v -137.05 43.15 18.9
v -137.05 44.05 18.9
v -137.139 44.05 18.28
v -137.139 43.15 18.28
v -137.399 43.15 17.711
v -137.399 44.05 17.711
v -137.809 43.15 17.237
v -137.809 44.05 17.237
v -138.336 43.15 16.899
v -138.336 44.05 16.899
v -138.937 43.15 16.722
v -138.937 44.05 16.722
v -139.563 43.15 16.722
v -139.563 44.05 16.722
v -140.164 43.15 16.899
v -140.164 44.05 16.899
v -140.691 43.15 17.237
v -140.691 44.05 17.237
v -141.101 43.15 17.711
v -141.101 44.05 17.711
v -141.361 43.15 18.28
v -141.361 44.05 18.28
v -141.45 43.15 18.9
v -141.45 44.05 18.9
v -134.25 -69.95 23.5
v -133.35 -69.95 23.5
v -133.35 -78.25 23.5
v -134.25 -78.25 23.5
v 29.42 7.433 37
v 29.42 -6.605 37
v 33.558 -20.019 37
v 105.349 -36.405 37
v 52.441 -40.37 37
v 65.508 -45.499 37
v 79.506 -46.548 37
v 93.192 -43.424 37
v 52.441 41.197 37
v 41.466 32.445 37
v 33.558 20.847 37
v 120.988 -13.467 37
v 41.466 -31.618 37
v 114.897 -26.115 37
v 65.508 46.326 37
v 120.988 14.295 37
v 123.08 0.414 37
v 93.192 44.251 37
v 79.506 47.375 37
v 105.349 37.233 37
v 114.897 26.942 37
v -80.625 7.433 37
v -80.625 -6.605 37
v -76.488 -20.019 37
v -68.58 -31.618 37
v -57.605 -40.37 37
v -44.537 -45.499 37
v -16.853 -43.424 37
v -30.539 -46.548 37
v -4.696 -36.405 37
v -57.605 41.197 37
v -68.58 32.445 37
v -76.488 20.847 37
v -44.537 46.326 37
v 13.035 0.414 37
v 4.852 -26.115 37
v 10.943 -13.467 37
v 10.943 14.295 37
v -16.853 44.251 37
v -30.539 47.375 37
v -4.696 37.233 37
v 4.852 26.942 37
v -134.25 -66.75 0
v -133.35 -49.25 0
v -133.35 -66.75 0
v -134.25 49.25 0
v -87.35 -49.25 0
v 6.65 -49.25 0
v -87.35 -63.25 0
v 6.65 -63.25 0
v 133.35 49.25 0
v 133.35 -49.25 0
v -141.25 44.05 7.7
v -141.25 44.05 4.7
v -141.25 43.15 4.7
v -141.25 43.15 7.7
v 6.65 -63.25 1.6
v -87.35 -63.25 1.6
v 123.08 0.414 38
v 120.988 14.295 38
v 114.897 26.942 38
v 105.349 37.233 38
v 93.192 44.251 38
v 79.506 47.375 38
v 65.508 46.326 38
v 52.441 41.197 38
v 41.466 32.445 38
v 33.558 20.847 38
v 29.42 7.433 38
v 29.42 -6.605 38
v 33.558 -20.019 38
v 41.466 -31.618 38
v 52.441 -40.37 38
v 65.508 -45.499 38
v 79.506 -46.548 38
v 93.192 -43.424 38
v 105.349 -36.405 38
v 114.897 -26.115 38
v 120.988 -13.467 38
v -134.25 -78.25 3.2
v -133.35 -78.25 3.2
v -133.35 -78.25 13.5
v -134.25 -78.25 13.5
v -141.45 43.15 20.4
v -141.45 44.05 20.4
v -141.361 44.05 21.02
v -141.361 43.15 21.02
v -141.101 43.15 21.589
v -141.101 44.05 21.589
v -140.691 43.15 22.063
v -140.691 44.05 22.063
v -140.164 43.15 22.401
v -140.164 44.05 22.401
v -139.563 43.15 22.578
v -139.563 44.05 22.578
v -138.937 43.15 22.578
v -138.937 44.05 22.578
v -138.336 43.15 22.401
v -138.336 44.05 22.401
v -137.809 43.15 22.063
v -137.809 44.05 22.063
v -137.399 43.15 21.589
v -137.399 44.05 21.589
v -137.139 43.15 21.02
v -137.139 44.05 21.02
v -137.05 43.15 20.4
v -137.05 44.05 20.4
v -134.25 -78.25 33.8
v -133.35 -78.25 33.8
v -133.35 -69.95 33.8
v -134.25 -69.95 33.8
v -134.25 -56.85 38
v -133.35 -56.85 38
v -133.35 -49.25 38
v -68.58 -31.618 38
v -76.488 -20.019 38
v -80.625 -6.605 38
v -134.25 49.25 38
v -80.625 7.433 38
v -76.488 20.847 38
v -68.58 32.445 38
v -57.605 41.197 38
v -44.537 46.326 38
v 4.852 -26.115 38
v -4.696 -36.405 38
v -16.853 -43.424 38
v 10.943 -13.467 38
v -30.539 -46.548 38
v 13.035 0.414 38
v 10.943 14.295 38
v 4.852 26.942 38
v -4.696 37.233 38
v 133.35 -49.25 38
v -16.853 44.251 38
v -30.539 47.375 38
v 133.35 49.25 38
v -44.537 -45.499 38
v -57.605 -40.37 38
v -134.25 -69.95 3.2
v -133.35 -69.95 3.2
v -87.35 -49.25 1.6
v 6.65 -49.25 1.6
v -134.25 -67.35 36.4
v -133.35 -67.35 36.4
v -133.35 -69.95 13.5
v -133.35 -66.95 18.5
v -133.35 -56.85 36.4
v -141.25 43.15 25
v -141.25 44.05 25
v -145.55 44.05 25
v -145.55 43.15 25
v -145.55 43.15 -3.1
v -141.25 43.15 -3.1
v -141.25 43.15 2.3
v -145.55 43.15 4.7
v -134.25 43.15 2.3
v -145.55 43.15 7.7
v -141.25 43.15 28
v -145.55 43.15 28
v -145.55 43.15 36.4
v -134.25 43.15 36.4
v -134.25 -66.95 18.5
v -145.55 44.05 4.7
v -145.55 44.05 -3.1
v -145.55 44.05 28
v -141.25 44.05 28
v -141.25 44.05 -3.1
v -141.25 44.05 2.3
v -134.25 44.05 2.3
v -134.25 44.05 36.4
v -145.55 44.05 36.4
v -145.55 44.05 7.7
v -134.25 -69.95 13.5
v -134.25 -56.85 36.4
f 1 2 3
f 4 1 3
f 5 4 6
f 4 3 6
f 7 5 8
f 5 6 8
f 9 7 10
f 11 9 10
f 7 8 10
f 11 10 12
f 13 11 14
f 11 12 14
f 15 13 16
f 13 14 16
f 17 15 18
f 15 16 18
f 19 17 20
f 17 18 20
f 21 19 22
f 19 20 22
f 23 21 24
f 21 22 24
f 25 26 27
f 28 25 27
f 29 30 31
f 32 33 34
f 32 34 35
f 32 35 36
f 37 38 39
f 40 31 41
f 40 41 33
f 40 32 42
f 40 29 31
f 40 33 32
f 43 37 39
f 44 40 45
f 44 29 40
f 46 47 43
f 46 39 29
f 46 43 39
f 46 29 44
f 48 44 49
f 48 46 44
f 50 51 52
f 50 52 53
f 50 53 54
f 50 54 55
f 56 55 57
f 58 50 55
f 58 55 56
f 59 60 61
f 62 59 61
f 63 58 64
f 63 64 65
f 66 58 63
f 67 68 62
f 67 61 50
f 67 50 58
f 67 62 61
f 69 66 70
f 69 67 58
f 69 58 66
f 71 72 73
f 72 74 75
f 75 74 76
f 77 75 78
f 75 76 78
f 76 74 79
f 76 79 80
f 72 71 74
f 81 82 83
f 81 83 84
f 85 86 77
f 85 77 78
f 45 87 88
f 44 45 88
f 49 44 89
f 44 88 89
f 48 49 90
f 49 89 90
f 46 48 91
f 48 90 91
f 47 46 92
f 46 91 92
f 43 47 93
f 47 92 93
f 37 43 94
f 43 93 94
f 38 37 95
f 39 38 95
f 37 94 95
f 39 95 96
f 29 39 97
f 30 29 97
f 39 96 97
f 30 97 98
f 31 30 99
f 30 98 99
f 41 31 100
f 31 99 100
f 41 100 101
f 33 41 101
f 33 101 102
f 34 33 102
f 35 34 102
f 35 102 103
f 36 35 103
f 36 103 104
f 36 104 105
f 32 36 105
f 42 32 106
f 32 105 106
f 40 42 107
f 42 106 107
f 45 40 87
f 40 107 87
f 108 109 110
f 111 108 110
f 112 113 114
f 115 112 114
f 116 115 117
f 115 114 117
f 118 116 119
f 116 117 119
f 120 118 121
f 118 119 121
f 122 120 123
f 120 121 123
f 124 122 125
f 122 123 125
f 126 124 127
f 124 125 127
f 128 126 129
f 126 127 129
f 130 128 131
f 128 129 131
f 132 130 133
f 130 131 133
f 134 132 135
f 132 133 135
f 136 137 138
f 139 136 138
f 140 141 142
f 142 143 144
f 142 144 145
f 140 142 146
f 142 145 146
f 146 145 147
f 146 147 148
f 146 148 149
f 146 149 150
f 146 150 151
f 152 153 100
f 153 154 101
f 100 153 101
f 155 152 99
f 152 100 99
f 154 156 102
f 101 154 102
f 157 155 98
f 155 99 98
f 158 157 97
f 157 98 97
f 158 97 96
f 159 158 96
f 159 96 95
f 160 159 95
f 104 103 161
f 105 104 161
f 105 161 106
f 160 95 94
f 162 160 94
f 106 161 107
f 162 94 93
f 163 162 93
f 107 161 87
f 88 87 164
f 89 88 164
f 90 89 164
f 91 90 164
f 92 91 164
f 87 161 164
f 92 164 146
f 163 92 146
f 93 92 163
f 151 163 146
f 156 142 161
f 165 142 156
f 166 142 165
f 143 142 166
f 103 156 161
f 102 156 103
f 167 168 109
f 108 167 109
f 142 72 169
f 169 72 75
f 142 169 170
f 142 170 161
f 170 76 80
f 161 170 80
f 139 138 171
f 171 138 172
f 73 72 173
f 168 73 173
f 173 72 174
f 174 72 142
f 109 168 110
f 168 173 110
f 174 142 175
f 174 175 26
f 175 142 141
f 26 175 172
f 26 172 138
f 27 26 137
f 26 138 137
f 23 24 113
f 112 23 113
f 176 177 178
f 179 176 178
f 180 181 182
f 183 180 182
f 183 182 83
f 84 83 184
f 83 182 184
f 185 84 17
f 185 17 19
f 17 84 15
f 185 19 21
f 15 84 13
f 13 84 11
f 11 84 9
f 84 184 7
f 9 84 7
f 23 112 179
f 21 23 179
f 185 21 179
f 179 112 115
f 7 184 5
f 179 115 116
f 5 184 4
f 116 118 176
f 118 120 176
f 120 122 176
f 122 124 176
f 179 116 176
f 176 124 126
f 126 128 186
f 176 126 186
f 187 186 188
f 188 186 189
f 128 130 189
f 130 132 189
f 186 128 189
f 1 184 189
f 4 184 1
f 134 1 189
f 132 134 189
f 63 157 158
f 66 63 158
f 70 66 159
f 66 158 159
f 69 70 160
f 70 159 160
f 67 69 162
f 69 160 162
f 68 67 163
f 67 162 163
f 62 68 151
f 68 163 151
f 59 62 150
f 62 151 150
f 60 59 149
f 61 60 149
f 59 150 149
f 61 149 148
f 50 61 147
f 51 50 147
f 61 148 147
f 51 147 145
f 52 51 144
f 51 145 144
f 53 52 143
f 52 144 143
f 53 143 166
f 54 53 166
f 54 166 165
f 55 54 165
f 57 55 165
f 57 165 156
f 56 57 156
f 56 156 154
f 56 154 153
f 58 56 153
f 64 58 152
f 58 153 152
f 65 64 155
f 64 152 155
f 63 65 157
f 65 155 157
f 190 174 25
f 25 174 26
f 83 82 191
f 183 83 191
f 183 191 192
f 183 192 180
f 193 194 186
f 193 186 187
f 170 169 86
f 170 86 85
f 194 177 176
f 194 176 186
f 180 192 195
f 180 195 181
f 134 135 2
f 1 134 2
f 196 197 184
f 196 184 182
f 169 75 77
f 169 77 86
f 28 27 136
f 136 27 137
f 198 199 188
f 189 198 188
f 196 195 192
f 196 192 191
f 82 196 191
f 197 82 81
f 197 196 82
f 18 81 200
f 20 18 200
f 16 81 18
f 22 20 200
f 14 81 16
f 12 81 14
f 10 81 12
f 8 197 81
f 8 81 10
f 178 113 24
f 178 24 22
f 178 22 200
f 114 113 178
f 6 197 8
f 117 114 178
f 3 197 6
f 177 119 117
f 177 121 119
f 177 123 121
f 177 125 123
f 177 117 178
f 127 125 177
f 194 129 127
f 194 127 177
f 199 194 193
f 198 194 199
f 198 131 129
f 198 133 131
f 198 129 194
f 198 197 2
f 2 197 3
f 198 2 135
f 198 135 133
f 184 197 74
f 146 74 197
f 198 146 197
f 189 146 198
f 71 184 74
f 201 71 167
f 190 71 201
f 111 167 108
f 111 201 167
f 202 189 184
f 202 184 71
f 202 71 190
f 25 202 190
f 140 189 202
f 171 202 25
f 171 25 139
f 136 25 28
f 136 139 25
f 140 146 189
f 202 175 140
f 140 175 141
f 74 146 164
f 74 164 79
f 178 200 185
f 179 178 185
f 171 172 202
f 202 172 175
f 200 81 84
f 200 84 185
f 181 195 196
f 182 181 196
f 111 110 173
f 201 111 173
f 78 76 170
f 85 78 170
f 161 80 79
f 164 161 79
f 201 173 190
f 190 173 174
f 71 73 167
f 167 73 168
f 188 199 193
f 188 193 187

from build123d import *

# Parameters (mm, degrees)
F0_W      = 266.7
F0_H      = 98.5
F1_DEPTH  = 38
F2_R      = 47.092995
F3_DEPTH  = 1
F5_DEPTH  = 0.9
F6_W      = 0.9
F6_H      = 39.5
F7_DEPTH  = 11.3
F8_W      = 7
F8_H      = 5.4
F8_W_2    = 4.3
F8_H_2    = 3
F9_DEPTH  = 0.9
F10_W     = 94
F10_H     = 1.6
F11_DEPTH = 14


with BuildPart() as f1:
    # F0 (on Top) → F1 (new body)
    with BuildSketch(Plane.XY):
        Rectangle(F0_W, F0_H)
    extrude(amount=F1_DEPTH)

    # F2 (on face) → F3 (cut)
    with BuildSketch(Plane.XY.offset(38)):
        with Locations((-34.058255, 0.413742)):
            Circle(F2_R)
        with Locations((75.987235, 0.413742)):
            Circle(F2_R)
    extrude(amount=-F3_DEPTH, mode=Mode.SUBTRACT)

    # F4 (on face) → F5 (join)
    with BuildSketch(Plane(origin=(-133.35, 0, 0), x_dir=(0, -1, 0), z_dir=(-1, 0, 0))):
        Polygon((56.85, 38), (49.25, 38), (-49.25, 38), (-49.25, 0), (49.25, 0), (66.75, 0), (69.95, 3.2), (78.25, 3.2), (78.25, 13.5), (69.95, 13.5), (66.95, 18.5), (69.95, 23.5), (78.25, 23.5), (78.25, 33.8), (69.95, 33.8), (67.35, 36.4), (56.85, 36.4), align=None)
    extrude(amount=F5_DEPTH)

    # F6 (on face) → F7 (join)
    with BuildSketch(Plane(origin=(-134.25, 0, 0), x_dir=(0, -1, 0), z_dir=(-1, 0, 0))):
        with Locations((-43.6, 16.65)):
            Rectangle(F6_W, F6_H)
    extrude(amount=F7_DEPTH)

    # F8 (on face) → F9 (cut, through all)
    with BuildSketch(Plane(origin=(0, 44.05, 0), x_dir=(-1, 0, 0), z_dir=(0, 1, 0))):
        with Locations((137.75, -0.4)):
            Rectangle(F8_W, F8_H)
        with Locations((143.4, 26.5)):
            Rectangle(F8_W_2, F8_H_2)
        with Locations((143.4, 6.2)):
            Rectangle(F8_W_2, F8_H_2)
        with BuildLine():
            ThreePointArc((141.45, 20.4), (139.25, 22.6), (137.05, 20.4))
            Line((137.05, 20.4), (137.05, 18.9))
            ThreePointArc((137.05, 18.9), (139.25, 16.7), (141.45, 18.9))
            Line((141.45, 18.9), (141.45, 20.4))
        make_face()
    extrude(amount=-F9_DEPTH, mode=Mode.SUBTRACT)

    # F10 (on face) → F11 (join)
    with BuildSketch(Plane.XZ.offset(49.25)):
        with Locations((-40.35, 0.8)):
            Rectangle(F10_W, F10_H)
    extrude(amount=F11_DEPTH)


solid = f1.part
